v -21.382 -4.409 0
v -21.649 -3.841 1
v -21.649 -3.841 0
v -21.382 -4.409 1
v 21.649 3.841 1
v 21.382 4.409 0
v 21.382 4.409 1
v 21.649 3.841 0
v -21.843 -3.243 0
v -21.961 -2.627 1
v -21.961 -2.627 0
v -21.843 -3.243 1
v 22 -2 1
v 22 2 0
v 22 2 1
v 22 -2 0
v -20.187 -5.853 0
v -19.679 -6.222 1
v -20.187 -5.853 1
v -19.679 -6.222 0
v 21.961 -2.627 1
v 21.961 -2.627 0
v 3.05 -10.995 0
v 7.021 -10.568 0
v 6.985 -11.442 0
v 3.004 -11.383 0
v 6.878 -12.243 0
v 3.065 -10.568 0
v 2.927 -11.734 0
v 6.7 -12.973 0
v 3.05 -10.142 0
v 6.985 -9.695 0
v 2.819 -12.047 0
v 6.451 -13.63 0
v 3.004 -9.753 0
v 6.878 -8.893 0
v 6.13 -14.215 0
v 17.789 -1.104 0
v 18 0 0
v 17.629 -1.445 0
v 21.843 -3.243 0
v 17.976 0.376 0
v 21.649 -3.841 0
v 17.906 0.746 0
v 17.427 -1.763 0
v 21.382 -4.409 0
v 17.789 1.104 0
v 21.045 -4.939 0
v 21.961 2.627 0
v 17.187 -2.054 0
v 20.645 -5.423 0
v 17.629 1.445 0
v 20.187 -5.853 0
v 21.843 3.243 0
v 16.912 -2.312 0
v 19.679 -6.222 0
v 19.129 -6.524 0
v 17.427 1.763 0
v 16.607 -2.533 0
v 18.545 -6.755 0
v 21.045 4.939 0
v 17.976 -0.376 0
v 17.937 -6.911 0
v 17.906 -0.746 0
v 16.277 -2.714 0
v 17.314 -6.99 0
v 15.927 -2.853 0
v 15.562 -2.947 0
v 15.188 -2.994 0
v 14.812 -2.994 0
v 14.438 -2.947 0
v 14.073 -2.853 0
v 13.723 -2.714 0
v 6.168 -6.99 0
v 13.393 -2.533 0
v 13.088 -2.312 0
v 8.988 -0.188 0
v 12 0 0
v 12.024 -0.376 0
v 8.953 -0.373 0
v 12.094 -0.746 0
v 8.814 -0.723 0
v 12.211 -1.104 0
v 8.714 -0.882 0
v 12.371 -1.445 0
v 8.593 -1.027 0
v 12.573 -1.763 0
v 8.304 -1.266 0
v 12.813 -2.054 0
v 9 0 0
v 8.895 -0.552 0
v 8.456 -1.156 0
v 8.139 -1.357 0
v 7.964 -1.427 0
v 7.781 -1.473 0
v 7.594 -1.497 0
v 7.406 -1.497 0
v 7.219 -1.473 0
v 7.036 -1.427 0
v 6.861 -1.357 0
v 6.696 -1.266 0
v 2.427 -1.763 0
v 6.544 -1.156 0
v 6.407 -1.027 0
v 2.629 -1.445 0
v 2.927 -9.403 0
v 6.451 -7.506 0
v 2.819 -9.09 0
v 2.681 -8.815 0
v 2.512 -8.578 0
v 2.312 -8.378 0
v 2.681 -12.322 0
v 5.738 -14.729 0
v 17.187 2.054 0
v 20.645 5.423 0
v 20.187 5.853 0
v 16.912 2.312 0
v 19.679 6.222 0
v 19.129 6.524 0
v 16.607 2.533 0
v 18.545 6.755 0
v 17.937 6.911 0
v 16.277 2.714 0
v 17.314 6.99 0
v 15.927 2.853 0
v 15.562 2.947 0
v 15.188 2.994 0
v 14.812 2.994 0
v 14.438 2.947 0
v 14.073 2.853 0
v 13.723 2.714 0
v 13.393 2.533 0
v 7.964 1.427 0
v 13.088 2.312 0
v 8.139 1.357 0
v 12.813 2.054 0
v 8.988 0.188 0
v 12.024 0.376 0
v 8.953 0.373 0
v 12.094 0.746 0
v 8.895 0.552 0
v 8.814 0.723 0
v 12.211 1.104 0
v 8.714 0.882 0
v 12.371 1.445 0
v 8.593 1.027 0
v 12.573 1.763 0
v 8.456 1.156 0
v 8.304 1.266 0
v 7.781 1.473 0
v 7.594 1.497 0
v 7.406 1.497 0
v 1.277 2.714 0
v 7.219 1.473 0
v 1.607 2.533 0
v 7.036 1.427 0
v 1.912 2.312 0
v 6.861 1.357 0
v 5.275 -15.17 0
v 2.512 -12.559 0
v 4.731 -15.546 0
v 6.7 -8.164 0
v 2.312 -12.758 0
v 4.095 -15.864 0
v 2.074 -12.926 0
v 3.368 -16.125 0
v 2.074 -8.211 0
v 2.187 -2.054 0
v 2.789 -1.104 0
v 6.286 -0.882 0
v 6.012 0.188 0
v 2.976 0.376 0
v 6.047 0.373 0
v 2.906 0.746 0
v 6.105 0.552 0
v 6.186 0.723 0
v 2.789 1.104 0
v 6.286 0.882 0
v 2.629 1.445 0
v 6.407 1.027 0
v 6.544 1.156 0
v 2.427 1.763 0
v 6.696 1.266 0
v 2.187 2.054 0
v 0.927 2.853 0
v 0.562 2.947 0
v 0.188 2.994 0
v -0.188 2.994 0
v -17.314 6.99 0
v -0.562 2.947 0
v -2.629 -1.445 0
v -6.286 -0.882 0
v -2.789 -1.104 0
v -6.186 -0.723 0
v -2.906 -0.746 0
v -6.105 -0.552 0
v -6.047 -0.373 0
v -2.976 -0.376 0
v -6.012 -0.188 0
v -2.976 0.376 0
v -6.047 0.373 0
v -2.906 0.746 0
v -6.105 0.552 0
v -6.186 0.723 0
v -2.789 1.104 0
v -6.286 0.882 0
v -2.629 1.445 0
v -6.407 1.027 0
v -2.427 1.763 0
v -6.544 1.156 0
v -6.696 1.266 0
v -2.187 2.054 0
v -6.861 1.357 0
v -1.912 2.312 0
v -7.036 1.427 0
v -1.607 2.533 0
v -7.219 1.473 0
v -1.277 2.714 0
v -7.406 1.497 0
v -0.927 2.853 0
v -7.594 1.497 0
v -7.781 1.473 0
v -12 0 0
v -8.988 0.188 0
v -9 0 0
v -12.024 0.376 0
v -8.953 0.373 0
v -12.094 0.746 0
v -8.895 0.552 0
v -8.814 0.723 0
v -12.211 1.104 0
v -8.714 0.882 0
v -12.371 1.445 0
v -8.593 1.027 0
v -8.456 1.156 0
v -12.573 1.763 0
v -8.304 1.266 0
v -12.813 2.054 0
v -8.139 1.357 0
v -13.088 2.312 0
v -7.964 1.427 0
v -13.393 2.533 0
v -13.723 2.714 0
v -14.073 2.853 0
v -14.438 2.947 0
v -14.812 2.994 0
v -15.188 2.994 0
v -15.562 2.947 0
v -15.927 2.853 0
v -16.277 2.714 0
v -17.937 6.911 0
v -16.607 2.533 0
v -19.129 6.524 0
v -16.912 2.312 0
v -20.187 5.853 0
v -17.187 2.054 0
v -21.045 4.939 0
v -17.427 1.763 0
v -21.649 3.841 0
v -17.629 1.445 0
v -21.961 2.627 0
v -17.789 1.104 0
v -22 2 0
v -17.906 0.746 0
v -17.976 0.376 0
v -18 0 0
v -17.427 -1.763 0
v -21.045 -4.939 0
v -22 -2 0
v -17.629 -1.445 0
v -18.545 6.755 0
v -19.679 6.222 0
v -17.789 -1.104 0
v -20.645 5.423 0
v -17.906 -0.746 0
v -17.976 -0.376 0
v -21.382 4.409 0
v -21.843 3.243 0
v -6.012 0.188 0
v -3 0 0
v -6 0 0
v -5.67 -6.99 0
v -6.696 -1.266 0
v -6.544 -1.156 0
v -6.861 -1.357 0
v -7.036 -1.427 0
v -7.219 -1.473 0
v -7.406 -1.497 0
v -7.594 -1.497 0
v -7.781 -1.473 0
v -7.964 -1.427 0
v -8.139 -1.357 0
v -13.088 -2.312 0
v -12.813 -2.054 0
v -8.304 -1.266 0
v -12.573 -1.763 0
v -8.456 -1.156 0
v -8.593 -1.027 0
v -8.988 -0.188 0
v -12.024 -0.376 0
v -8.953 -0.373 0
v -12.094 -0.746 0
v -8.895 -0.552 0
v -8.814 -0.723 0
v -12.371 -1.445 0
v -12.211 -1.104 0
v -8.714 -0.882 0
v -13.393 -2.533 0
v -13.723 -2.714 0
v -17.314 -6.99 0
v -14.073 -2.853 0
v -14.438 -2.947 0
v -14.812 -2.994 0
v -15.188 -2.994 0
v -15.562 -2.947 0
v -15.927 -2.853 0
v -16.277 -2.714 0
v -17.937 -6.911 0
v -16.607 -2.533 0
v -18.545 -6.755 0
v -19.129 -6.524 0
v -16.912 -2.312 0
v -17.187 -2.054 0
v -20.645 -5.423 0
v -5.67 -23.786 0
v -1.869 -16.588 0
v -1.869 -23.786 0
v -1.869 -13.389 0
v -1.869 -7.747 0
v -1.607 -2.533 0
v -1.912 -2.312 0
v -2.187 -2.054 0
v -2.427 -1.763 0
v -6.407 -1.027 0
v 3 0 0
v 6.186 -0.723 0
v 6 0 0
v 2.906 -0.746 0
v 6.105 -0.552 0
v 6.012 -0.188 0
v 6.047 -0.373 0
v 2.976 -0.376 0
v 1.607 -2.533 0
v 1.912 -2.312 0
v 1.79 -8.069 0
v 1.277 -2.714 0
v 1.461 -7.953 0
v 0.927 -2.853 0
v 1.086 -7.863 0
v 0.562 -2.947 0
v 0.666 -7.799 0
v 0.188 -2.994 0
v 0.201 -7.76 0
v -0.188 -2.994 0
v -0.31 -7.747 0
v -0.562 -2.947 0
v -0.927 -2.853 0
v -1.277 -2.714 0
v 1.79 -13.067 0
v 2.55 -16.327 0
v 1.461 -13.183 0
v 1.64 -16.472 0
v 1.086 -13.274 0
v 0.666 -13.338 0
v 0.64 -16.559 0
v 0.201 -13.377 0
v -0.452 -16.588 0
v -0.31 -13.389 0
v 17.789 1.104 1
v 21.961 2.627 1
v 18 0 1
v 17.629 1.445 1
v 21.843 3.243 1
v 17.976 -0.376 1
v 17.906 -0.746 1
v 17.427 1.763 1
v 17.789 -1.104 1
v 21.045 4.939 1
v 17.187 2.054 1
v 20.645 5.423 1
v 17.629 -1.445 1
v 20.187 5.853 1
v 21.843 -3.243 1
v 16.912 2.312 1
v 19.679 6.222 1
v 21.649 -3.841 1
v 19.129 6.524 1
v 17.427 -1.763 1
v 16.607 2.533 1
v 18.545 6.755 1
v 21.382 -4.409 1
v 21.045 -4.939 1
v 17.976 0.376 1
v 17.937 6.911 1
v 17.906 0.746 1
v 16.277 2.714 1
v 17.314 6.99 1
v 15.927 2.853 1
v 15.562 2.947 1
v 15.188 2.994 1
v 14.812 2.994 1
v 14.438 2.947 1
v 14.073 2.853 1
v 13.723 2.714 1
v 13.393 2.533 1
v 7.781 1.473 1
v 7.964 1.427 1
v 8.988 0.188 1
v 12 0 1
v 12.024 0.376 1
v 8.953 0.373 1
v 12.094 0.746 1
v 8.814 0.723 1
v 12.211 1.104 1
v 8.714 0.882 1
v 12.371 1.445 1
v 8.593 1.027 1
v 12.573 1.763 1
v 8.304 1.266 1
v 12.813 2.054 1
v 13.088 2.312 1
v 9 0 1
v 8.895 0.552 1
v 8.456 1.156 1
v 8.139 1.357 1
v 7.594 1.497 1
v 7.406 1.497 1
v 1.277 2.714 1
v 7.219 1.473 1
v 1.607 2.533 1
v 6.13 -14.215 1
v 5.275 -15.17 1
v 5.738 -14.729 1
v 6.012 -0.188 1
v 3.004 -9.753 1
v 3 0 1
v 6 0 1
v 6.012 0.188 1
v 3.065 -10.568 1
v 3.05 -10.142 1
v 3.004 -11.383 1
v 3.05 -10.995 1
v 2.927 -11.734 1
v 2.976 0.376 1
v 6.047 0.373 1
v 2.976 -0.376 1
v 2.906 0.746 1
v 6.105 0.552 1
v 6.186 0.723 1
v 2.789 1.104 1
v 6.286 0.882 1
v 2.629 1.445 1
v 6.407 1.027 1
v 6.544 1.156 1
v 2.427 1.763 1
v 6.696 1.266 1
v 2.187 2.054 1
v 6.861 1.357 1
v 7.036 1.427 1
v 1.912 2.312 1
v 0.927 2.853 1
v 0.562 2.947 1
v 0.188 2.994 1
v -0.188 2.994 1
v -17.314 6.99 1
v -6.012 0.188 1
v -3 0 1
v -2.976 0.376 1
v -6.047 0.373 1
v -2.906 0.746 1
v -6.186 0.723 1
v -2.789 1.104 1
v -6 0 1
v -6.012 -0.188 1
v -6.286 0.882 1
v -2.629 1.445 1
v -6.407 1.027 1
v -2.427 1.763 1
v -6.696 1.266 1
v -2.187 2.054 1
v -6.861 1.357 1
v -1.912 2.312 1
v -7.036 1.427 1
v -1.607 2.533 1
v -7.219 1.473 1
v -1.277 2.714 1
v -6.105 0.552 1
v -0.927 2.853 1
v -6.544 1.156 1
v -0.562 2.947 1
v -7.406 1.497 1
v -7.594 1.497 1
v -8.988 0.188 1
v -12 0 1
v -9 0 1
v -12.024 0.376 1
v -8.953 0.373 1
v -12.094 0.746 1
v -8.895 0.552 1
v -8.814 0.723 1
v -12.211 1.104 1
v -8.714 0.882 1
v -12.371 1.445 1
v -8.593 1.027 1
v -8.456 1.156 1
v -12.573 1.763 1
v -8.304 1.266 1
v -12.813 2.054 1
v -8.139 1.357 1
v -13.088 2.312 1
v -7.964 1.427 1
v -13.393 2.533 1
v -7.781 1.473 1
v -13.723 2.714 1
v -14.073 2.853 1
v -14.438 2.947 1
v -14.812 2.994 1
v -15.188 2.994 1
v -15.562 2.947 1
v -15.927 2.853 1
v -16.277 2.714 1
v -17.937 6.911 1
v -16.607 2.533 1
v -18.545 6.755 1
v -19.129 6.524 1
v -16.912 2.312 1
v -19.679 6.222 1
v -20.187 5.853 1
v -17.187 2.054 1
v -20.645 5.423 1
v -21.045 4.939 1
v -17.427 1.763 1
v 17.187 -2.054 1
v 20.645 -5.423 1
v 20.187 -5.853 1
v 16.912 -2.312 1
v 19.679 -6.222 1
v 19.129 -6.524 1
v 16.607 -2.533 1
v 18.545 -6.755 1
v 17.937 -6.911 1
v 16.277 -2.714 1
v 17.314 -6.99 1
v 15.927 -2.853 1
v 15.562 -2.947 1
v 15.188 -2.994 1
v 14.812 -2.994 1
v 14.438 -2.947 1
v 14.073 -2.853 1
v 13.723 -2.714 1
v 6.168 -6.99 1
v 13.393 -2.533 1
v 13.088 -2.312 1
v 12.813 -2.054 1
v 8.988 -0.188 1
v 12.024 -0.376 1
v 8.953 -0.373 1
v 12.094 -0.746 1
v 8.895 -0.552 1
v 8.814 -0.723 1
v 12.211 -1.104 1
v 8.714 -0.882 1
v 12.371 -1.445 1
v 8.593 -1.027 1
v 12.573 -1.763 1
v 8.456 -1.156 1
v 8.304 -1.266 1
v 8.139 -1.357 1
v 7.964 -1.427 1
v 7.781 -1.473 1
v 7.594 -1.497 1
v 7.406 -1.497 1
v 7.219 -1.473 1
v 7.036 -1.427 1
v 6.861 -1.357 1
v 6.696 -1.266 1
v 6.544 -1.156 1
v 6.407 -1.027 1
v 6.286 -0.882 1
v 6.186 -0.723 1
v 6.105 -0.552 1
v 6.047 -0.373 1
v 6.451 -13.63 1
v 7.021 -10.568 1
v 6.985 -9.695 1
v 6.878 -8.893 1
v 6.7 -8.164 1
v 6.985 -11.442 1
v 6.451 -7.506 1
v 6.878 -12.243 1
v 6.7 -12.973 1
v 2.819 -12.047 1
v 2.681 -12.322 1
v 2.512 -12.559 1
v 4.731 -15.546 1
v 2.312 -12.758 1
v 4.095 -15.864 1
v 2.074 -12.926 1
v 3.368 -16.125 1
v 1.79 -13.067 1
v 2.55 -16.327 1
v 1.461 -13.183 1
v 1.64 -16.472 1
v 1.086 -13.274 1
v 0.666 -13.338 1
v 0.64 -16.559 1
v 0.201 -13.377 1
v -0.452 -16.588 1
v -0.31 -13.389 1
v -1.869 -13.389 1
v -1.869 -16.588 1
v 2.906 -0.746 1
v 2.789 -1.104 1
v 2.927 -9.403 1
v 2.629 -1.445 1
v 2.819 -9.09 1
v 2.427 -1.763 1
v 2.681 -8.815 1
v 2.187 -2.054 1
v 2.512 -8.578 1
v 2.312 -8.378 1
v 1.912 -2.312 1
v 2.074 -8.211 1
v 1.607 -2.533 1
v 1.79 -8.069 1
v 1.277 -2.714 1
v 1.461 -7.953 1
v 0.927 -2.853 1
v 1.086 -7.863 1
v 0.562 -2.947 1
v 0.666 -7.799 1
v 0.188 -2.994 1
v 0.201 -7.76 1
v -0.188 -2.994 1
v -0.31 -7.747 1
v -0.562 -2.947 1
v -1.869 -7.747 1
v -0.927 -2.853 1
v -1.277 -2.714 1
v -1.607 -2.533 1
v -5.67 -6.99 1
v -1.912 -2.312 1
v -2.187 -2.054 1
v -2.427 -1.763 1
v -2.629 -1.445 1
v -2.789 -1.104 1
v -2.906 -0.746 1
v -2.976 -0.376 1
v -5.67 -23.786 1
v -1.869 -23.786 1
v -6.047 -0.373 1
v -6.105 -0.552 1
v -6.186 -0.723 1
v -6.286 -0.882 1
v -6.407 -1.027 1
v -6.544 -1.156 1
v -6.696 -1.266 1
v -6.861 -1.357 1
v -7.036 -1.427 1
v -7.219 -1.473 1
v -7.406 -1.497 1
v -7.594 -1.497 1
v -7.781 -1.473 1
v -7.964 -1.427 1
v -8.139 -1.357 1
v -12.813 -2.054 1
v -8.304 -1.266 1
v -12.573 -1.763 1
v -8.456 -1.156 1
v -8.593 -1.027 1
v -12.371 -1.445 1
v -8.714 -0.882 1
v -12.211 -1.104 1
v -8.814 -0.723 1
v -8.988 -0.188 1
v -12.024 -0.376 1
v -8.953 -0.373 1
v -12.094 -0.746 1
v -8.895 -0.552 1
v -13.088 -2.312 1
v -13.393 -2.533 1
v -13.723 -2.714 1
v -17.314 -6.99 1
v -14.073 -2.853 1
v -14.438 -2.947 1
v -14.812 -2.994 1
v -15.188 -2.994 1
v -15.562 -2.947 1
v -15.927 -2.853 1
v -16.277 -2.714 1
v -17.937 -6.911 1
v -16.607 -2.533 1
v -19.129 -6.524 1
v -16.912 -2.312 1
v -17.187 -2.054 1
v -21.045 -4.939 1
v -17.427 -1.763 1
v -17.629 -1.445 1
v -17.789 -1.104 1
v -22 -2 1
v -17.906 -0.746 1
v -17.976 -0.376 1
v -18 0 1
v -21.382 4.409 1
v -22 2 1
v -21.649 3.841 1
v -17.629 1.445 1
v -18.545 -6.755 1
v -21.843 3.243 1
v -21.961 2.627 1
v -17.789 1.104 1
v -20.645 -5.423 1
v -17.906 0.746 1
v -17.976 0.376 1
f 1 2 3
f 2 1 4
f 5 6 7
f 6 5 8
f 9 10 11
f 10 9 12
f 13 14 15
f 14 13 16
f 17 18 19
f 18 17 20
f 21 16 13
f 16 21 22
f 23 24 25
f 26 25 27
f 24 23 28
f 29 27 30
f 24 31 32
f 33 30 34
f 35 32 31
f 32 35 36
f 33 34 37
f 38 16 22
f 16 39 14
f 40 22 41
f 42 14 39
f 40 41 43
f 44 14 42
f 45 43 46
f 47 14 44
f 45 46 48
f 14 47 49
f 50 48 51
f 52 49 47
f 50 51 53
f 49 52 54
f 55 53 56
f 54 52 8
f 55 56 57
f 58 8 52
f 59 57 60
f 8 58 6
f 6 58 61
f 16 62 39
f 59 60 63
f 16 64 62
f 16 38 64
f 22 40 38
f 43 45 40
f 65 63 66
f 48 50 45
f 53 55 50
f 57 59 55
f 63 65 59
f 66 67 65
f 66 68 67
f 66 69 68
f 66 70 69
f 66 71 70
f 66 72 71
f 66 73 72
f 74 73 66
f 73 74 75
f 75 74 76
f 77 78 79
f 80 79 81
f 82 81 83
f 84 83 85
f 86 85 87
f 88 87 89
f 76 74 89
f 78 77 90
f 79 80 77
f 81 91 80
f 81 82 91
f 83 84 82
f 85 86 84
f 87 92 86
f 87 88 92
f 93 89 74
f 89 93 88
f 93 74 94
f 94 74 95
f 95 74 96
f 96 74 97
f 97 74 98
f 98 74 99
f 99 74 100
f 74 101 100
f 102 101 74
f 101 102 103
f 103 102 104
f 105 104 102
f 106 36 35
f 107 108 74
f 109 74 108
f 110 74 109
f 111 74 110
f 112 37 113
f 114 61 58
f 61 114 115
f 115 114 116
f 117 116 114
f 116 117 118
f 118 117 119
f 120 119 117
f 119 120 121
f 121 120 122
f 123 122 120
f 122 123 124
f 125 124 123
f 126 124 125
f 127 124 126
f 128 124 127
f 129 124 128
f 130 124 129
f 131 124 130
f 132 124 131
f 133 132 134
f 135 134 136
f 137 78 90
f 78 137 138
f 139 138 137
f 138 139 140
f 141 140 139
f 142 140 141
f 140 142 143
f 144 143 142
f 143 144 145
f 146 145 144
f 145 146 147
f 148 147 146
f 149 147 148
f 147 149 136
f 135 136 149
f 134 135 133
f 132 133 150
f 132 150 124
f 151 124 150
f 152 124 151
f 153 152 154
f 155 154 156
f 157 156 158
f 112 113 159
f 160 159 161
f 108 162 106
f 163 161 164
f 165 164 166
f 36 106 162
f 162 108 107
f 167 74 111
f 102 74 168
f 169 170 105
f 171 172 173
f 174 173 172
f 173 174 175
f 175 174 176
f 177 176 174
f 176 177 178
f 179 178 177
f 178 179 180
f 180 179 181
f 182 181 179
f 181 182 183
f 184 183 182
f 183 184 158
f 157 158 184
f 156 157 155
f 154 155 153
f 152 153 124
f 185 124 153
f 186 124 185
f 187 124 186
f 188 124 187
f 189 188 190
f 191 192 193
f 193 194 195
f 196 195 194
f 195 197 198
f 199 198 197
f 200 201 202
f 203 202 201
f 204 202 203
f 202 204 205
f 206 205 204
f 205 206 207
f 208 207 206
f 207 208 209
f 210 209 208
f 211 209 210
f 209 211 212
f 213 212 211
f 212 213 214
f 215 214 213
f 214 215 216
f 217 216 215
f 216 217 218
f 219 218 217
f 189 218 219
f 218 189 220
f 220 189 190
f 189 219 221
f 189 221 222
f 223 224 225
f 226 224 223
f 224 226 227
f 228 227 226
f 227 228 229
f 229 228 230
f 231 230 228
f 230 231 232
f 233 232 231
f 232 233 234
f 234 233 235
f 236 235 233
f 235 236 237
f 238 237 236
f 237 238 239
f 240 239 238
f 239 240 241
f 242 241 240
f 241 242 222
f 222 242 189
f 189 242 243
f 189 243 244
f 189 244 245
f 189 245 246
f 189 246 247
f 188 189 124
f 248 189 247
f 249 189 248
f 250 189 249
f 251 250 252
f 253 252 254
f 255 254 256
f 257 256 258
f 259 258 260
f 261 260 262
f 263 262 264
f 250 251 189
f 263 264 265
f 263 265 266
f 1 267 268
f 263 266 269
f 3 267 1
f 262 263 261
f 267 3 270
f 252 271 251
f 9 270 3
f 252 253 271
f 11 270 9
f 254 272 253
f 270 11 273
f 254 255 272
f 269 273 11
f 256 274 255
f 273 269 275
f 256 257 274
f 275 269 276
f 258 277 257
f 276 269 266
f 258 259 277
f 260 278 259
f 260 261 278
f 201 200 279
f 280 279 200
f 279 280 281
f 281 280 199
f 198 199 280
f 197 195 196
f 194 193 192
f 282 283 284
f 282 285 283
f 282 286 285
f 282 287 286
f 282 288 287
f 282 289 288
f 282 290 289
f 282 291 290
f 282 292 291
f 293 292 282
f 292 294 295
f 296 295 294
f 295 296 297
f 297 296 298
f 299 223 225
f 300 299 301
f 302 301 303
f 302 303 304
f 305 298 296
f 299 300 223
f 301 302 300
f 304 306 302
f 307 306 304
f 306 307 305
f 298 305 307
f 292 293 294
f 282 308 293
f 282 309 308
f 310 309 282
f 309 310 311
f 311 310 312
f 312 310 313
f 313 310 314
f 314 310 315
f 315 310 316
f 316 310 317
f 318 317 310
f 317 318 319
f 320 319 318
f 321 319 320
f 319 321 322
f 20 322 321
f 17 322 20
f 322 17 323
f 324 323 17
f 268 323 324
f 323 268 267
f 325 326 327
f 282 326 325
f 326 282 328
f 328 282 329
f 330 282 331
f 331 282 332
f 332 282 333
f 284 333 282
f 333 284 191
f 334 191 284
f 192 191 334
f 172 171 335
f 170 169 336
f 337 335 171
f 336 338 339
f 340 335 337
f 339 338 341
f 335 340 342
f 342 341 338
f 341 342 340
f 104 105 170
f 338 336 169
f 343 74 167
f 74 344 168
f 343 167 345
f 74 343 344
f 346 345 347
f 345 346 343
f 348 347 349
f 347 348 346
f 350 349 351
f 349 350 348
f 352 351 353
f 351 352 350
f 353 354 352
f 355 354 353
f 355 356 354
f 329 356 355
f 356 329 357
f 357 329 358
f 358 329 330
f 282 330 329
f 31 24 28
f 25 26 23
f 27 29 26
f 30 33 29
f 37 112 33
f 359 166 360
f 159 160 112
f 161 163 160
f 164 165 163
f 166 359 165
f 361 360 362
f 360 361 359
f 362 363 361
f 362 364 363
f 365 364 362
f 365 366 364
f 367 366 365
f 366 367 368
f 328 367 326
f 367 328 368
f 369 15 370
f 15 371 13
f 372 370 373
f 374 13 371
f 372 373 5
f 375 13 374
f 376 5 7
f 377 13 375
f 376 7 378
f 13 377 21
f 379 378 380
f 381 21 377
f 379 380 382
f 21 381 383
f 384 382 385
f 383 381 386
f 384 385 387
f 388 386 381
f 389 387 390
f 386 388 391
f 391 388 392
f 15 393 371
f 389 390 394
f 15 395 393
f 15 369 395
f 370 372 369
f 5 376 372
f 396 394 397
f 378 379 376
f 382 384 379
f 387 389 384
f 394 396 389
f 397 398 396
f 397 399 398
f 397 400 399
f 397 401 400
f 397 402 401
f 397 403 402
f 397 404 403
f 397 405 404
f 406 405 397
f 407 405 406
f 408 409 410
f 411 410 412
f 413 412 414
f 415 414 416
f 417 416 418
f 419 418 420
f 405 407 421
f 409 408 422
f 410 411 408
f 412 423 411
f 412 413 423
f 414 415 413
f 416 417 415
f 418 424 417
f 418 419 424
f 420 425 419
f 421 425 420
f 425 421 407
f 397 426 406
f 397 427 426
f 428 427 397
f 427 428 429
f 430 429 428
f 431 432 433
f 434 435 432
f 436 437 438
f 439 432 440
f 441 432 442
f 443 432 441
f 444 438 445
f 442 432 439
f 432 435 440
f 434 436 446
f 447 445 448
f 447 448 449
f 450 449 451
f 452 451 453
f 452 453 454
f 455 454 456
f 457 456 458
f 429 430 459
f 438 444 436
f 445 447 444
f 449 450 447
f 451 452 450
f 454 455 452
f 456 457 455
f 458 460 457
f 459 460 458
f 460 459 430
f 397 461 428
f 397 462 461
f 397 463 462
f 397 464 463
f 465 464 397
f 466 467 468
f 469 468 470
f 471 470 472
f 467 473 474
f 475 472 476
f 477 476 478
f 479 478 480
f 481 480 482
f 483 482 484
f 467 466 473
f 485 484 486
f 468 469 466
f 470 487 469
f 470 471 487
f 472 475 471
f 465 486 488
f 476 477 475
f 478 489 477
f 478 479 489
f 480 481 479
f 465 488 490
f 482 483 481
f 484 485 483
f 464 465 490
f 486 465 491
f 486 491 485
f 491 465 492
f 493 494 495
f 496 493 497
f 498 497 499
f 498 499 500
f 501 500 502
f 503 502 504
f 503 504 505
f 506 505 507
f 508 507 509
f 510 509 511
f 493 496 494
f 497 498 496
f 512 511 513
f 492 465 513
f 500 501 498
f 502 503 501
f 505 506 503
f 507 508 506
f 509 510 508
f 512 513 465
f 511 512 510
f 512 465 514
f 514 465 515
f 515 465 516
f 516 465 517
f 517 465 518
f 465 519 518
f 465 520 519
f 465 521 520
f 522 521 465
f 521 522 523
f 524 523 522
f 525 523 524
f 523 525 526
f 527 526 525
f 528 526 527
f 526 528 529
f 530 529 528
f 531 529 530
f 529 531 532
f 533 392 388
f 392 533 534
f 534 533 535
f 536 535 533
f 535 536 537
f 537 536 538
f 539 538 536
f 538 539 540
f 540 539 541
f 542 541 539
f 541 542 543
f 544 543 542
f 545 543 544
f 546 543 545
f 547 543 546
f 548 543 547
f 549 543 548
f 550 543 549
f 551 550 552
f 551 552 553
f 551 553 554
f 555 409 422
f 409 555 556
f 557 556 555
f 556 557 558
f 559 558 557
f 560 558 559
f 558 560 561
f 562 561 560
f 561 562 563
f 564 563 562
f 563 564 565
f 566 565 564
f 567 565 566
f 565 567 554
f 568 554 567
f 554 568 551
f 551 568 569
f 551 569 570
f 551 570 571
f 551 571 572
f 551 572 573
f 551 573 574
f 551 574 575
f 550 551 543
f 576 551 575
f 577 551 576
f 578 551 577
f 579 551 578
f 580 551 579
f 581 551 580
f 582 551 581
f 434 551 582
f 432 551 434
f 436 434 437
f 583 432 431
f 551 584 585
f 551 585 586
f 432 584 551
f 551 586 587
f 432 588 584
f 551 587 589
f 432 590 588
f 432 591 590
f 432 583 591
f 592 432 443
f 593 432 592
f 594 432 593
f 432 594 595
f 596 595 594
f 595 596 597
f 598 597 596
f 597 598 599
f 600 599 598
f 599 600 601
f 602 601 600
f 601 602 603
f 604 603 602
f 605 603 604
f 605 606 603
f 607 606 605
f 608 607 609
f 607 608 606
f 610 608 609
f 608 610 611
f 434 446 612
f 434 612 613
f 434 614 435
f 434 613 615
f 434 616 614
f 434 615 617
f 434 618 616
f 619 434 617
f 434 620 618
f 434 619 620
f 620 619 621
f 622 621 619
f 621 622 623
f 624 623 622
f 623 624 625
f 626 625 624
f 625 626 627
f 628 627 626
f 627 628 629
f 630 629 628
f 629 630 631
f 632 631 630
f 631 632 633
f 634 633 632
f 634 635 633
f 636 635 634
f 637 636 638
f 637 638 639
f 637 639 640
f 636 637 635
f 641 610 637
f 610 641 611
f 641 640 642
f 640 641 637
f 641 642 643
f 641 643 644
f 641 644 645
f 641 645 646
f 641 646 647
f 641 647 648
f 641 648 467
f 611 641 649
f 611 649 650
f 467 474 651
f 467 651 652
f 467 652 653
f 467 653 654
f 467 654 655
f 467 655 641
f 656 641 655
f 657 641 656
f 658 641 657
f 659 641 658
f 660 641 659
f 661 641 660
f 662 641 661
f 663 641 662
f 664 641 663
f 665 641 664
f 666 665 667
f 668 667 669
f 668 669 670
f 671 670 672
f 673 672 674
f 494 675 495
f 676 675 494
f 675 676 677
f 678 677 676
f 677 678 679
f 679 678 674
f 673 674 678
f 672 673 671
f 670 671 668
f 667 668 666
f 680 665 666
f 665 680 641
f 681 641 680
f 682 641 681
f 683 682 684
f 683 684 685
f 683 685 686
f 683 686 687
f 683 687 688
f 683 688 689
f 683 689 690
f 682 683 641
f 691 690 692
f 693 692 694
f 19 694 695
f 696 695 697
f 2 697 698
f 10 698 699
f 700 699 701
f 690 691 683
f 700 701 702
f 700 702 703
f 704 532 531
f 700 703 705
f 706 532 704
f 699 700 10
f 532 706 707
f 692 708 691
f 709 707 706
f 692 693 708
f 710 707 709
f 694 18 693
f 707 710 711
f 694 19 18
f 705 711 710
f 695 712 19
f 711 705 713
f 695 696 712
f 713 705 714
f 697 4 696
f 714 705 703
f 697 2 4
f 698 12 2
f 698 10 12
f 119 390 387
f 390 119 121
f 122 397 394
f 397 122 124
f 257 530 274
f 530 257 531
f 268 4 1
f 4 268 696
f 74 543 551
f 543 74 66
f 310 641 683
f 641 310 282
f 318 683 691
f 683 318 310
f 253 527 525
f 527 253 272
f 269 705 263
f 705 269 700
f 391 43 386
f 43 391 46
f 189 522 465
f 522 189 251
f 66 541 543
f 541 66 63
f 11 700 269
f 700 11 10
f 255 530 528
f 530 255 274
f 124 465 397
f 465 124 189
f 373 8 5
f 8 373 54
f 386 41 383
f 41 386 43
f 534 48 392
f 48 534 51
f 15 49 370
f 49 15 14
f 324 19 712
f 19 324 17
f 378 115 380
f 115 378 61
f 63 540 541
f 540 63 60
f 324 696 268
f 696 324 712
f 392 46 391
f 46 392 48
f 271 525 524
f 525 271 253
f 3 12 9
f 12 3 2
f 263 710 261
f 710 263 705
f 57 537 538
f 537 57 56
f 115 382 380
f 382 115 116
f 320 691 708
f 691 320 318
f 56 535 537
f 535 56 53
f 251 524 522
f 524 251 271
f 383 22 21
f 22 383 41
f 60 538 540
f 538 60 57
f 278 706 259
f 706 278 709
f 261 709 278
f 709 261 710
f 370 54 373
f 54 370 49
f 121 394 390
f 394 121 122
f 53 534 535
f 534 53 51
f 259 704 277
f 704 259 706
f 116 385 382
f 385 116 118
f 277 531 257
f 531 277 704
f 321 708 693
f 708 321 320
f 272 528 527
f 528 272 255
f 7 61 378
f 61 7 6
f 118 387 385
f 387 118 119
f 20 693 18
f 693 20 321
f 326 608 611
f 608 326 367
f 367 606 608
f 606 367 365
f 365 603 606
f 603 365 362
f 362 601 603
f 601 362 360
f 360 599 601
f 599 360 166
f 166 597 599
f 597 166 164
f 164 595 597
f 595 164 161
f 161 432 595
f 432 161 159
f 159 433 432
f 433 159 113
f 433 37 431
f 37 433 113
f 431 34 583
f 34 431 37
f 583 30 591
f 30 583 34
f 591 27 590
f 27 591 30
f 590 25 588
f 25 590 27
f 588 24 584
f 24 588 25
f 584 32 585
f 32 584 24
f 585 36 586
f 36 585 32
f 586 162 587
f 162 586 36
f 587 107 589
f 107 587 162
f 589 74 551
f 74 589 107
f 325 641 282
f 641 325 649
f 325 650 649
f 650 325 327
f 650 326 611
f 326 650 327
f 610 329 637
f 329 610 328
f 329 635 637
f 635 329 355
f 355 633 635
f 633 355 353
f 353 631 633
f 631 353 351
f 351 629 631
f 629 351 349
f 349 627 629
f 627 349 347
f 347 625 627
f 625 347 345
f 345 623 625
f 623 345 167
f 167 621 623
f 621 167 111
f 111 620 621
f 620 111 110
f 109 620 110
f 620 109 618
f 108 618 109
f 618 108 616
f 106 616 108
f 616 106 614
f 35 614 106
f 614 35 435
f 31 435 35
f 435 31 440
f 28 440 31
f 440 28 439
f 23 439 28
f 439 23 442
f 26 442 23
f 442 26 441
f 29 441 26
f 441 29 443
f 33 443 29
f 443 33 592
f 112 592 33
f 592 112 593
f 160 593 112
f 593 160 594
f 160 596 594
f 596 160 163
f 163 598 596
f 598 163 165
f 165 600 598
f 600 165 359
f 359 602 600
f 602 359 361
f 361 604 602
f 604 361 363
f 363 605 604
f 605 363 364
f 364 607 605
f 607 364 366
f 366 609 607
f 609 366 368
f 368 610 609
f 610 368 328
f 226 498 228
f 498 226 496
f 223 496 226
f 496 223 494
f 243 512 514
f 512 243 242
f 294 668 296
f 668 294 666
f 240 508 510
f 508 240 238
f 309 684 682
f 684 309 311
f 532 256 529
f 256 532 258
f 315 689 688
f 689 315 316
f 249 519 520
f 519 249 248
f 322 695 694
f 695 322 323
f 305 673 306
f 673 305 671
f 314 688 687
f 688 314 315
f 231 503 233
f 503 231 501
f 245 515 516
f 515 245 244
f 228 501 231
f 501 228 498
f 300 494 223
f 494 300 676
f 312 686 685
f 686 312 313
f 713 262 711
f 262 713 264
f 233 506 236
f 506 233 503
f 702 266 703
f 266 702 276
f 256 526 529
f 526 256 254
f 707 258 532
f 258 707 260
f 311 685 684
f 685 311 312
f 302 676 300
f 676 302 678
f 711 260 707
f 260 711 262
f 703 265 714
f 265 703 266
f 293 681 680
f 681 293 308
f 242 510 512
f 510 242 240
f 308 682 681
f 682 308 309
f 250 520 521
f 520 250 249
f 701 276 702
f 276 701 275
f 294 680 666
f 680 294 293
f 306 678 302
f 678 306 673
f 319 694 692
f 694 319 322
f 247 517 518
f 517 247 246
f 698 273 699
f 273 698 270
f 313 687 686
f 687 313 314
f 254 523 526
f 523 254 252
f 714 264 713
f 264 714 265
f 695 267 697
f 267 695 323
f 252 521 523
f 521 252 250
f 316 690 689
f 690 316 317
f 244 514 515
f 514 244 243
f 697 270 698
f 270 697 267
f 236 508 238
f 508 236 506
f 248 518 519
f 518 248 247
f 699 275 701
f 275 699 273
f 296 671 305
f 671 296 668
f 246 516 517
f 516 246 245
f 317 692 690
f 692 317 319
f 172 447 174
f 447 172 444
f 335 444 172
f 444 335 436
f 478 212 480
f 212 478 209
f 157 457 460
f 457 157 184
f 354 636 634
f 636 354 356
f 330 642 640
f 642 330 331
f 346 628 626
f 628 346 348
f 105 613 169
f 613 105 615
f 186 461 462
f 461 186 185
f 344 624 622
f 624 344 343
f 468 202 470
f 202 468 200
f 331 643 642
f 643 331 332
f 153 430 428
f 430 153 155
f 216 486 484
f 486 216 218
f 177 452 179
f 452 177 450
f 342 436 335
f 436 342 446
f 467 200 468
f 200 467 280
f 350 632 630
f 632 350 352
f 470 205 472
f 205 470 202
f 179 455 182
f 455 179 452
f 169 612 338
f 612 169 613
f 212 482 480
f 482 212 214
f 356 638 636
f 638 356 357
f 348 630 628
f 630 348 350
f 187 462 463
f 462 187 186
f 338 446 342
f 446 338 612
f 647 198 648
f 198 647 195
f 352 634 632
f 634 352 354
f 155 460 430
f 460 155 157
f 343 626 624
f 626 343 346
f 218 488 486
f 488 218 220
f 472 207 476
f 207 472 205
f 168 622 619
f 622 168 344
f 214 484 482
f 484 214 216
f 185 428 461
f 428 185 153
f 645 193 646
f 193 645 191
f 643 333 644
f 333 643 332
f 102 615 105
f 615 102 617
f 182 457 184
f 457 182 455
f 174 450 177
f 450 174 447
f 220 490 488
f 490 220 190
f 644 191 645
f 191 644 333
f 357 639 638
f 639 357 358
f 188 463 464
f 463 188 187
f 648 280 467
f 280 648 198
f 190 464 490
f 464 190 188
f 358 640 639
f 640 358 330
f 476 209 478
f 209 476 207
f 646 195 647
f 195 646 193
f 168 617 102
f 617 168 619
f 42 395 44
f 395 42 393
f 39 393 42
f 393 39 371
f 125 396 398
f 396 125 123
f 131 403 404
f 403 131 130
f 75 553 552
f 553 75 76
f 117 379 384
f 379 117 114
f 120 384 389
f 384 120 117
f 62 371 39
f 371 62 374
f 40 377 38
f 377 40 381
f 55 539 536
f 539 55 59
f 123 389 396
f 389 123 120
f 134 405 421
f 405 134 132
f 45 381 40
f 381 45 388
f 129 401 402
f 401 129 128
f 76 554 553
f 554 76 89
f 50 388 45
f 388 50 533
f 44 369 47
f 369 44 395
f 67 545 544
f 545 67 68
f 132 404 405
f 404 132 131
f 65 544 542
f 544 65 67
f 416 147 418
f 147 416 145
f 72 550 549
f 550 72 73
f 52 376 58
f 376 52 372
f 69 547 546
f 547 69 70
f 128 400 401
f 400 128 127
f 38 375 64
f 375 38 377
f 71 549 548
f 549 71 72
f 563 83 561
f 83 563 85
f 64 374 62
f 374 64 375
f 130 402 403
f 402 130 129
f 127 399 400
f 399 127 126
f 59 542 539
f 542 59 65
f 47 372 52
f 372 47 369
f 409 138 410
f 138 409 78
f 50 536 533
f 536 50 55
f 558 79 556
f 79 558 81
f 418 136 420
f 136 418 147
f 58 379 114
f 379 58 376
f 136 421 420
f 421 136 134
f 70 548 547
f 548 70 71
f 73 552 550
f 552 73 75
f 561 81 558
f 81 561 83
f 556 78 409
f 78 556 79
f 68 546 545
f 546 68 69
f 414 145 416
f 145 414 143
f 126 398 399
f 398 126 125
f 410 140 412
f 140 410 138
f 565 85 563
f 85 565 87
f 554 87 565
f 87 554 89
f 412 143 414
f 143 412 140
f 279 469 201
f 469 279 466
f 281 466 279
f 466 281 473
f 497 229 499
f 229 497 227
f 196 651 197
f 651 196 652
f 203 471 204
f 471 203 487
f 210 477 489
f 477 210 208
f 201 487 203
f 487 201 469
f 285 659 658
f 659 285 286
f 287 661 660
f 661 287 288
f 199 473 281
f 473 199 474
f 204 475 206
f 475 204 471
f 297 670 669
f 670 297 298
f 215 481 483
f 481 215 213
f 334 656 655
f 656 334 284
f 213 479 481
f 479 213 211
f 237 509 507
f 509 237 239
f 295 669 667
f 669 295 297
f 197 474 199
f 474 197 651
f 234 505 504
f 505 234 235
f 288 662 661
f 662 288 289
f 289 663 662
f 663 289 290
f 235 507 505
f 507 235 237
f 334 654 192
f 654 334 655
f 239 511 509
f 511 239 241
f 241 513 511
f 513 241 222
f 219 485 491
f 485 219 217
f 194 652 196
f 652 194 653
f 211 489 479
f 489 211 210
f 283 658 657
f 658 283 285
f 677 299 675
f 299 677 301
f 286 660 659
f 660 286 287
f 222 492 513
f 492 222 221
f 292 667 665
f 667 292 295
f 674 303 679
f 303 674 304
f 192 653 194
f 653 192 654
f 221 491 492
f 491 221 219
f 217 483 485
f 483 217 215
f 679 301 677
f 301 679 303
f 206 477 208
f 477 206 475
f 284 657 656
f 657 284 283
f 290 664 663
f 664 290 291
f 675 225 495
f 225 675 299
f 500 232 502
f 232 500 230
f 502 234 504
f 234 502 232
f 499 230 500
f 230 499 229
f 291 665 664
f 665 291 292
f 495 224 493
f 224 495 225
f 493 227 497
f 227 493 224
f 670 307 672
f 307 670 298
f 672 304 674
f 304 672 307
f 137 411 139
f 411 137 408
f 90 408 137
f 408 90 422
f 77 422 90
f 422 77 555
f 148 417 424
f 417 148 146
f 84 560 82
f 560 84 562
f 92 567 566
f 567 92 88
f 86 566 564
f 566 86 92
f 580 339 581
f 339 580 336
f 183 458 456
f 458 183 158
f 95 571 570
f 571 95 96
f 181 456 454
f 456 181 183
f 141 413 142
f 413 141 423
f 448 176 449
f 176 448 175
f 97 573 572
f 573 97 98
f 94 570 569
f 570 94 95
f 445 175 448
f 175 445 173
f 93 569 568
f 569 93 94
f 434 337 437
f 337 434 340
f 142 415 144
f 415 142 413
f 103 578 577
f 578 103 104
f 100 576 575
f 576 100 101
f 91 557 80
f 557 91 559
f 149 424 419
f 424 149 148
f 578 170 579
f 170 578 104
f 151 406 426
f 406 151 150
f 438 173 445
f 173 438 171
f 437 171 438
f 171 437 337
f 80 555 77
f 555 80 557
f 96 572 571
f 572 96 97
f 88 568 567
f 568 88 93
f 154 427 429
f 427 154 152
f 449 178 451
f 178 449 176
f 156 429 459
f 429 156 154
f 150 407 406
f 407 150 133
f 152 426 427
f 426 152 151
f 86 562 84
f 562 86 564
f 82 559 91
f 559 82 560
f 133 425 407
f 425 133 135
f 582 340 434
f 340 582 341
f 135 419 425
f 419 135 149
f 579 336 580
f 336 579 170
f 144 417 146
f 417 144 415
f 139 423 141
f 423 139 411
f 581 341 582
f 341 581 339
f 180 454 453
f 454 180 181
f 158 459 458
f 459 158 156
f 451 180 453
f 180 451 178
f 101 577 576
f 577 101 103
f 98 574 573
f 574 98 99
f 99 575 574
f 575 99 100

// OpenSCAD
$fn = 50;


difference() {
	union() {
		*color(alpha = 1.0000000000, c = "gray") {
			translate(v = [0, 14, 0]) {
				linear_extrude(height = 1) {
					text(font = "Arial:style=Bold", halign = "center", size = 4.5000000000, text = "COMMENT description oobb_plate_shape_p_type_1_depth_3_width_1_thickness_p_extra_oobb_size", valign = "center");
				}
			}
		}
		hull() {
			translate(v = [-17.0000000000, 2.0000000000, 0]) {
				cylinder(h = 1, r = 5);
			}
			translate(v = [17.0000000000, 2.0000000000, 0]) {
				cylinder(h = 1, r = 5);
			}
			translate(v = [-17.0000000000, -2.0000000000, 0]) {
				cylinder(h = 1, r = 5);
			}
			translate(v = [17.0000000000, -2.0000000000, 0]) {
				cylinder(h = 1, r = 5);
			}
		}
		translate(v = [0, -5, 0]) {
			linear_extrude(height = 1) {
				text(font = "DejaVu Sans Mono:style=Bold", halign = "center", size = 19.0000000000, text = "P", valign = "top");
			}
		}
	}
	union() {
		*color(alpha = 1.0000000000, c = "gray") {
			translate(v = [0, 14, 0]) {
				linear_extrude(height = 1) {
					text(font = "Arial:style=Bold", halign = "center", size = 4.5000000000, text = "COMMENT description oobb_holes_shape_n_type_3_width_1_thickness_p_extra_oobb_size_1_height_'all'_holes_true_both_holes", valign = "center");
				}
			}
		}
		translate(v = [-15.0000000000, 0.0000000000, 0]) {
			translate(v = [0, 0, -50]) {
				cylinder(h = 100, r = 3.0000000000);
			}
		}
		translate(v = [0, 0, -50]) {
			cylinder(h = 100, r = 3.0000000000);
		}
		translate(v = [15.0000000000, 0.0000000000, 0]) {
			translate(v = [0, 0, -50]) {
				cylinder(h = 100, r = 3.0000000000);
			}
		}
		translate(v = [-15.0000000000, 0.0000000000, 0]) {
			translate(v = [0, 0, -50]) {
				cylinder(h = 100, r = 1.5000000000);
			}
		}
		translate(v = [-7.5000000000, 0.0000000000, 0]) {
			translate(v = [0, 0, -50]) {
				cylinder(h = 100, r = 1.5000000000);
			}
		}
		translate(v = [0, 0, -50]) {
			cylinder(h = 100, r = 1.5000000000);
		}
		translate(v = [7.5000000000, 0.0000000000, 0]) {
			translate(v = [0, 0, -50]) {
				cylinder(h = 100, r = 1.5000000000);
			}
		}
		translate(v = [15.0000000000, 0.0000000000, 0]) {
			translate(v = [0, 0, -50]) {
				cylinder(h = 100, r = 1.5000000000);
			}
		}
	}
}
